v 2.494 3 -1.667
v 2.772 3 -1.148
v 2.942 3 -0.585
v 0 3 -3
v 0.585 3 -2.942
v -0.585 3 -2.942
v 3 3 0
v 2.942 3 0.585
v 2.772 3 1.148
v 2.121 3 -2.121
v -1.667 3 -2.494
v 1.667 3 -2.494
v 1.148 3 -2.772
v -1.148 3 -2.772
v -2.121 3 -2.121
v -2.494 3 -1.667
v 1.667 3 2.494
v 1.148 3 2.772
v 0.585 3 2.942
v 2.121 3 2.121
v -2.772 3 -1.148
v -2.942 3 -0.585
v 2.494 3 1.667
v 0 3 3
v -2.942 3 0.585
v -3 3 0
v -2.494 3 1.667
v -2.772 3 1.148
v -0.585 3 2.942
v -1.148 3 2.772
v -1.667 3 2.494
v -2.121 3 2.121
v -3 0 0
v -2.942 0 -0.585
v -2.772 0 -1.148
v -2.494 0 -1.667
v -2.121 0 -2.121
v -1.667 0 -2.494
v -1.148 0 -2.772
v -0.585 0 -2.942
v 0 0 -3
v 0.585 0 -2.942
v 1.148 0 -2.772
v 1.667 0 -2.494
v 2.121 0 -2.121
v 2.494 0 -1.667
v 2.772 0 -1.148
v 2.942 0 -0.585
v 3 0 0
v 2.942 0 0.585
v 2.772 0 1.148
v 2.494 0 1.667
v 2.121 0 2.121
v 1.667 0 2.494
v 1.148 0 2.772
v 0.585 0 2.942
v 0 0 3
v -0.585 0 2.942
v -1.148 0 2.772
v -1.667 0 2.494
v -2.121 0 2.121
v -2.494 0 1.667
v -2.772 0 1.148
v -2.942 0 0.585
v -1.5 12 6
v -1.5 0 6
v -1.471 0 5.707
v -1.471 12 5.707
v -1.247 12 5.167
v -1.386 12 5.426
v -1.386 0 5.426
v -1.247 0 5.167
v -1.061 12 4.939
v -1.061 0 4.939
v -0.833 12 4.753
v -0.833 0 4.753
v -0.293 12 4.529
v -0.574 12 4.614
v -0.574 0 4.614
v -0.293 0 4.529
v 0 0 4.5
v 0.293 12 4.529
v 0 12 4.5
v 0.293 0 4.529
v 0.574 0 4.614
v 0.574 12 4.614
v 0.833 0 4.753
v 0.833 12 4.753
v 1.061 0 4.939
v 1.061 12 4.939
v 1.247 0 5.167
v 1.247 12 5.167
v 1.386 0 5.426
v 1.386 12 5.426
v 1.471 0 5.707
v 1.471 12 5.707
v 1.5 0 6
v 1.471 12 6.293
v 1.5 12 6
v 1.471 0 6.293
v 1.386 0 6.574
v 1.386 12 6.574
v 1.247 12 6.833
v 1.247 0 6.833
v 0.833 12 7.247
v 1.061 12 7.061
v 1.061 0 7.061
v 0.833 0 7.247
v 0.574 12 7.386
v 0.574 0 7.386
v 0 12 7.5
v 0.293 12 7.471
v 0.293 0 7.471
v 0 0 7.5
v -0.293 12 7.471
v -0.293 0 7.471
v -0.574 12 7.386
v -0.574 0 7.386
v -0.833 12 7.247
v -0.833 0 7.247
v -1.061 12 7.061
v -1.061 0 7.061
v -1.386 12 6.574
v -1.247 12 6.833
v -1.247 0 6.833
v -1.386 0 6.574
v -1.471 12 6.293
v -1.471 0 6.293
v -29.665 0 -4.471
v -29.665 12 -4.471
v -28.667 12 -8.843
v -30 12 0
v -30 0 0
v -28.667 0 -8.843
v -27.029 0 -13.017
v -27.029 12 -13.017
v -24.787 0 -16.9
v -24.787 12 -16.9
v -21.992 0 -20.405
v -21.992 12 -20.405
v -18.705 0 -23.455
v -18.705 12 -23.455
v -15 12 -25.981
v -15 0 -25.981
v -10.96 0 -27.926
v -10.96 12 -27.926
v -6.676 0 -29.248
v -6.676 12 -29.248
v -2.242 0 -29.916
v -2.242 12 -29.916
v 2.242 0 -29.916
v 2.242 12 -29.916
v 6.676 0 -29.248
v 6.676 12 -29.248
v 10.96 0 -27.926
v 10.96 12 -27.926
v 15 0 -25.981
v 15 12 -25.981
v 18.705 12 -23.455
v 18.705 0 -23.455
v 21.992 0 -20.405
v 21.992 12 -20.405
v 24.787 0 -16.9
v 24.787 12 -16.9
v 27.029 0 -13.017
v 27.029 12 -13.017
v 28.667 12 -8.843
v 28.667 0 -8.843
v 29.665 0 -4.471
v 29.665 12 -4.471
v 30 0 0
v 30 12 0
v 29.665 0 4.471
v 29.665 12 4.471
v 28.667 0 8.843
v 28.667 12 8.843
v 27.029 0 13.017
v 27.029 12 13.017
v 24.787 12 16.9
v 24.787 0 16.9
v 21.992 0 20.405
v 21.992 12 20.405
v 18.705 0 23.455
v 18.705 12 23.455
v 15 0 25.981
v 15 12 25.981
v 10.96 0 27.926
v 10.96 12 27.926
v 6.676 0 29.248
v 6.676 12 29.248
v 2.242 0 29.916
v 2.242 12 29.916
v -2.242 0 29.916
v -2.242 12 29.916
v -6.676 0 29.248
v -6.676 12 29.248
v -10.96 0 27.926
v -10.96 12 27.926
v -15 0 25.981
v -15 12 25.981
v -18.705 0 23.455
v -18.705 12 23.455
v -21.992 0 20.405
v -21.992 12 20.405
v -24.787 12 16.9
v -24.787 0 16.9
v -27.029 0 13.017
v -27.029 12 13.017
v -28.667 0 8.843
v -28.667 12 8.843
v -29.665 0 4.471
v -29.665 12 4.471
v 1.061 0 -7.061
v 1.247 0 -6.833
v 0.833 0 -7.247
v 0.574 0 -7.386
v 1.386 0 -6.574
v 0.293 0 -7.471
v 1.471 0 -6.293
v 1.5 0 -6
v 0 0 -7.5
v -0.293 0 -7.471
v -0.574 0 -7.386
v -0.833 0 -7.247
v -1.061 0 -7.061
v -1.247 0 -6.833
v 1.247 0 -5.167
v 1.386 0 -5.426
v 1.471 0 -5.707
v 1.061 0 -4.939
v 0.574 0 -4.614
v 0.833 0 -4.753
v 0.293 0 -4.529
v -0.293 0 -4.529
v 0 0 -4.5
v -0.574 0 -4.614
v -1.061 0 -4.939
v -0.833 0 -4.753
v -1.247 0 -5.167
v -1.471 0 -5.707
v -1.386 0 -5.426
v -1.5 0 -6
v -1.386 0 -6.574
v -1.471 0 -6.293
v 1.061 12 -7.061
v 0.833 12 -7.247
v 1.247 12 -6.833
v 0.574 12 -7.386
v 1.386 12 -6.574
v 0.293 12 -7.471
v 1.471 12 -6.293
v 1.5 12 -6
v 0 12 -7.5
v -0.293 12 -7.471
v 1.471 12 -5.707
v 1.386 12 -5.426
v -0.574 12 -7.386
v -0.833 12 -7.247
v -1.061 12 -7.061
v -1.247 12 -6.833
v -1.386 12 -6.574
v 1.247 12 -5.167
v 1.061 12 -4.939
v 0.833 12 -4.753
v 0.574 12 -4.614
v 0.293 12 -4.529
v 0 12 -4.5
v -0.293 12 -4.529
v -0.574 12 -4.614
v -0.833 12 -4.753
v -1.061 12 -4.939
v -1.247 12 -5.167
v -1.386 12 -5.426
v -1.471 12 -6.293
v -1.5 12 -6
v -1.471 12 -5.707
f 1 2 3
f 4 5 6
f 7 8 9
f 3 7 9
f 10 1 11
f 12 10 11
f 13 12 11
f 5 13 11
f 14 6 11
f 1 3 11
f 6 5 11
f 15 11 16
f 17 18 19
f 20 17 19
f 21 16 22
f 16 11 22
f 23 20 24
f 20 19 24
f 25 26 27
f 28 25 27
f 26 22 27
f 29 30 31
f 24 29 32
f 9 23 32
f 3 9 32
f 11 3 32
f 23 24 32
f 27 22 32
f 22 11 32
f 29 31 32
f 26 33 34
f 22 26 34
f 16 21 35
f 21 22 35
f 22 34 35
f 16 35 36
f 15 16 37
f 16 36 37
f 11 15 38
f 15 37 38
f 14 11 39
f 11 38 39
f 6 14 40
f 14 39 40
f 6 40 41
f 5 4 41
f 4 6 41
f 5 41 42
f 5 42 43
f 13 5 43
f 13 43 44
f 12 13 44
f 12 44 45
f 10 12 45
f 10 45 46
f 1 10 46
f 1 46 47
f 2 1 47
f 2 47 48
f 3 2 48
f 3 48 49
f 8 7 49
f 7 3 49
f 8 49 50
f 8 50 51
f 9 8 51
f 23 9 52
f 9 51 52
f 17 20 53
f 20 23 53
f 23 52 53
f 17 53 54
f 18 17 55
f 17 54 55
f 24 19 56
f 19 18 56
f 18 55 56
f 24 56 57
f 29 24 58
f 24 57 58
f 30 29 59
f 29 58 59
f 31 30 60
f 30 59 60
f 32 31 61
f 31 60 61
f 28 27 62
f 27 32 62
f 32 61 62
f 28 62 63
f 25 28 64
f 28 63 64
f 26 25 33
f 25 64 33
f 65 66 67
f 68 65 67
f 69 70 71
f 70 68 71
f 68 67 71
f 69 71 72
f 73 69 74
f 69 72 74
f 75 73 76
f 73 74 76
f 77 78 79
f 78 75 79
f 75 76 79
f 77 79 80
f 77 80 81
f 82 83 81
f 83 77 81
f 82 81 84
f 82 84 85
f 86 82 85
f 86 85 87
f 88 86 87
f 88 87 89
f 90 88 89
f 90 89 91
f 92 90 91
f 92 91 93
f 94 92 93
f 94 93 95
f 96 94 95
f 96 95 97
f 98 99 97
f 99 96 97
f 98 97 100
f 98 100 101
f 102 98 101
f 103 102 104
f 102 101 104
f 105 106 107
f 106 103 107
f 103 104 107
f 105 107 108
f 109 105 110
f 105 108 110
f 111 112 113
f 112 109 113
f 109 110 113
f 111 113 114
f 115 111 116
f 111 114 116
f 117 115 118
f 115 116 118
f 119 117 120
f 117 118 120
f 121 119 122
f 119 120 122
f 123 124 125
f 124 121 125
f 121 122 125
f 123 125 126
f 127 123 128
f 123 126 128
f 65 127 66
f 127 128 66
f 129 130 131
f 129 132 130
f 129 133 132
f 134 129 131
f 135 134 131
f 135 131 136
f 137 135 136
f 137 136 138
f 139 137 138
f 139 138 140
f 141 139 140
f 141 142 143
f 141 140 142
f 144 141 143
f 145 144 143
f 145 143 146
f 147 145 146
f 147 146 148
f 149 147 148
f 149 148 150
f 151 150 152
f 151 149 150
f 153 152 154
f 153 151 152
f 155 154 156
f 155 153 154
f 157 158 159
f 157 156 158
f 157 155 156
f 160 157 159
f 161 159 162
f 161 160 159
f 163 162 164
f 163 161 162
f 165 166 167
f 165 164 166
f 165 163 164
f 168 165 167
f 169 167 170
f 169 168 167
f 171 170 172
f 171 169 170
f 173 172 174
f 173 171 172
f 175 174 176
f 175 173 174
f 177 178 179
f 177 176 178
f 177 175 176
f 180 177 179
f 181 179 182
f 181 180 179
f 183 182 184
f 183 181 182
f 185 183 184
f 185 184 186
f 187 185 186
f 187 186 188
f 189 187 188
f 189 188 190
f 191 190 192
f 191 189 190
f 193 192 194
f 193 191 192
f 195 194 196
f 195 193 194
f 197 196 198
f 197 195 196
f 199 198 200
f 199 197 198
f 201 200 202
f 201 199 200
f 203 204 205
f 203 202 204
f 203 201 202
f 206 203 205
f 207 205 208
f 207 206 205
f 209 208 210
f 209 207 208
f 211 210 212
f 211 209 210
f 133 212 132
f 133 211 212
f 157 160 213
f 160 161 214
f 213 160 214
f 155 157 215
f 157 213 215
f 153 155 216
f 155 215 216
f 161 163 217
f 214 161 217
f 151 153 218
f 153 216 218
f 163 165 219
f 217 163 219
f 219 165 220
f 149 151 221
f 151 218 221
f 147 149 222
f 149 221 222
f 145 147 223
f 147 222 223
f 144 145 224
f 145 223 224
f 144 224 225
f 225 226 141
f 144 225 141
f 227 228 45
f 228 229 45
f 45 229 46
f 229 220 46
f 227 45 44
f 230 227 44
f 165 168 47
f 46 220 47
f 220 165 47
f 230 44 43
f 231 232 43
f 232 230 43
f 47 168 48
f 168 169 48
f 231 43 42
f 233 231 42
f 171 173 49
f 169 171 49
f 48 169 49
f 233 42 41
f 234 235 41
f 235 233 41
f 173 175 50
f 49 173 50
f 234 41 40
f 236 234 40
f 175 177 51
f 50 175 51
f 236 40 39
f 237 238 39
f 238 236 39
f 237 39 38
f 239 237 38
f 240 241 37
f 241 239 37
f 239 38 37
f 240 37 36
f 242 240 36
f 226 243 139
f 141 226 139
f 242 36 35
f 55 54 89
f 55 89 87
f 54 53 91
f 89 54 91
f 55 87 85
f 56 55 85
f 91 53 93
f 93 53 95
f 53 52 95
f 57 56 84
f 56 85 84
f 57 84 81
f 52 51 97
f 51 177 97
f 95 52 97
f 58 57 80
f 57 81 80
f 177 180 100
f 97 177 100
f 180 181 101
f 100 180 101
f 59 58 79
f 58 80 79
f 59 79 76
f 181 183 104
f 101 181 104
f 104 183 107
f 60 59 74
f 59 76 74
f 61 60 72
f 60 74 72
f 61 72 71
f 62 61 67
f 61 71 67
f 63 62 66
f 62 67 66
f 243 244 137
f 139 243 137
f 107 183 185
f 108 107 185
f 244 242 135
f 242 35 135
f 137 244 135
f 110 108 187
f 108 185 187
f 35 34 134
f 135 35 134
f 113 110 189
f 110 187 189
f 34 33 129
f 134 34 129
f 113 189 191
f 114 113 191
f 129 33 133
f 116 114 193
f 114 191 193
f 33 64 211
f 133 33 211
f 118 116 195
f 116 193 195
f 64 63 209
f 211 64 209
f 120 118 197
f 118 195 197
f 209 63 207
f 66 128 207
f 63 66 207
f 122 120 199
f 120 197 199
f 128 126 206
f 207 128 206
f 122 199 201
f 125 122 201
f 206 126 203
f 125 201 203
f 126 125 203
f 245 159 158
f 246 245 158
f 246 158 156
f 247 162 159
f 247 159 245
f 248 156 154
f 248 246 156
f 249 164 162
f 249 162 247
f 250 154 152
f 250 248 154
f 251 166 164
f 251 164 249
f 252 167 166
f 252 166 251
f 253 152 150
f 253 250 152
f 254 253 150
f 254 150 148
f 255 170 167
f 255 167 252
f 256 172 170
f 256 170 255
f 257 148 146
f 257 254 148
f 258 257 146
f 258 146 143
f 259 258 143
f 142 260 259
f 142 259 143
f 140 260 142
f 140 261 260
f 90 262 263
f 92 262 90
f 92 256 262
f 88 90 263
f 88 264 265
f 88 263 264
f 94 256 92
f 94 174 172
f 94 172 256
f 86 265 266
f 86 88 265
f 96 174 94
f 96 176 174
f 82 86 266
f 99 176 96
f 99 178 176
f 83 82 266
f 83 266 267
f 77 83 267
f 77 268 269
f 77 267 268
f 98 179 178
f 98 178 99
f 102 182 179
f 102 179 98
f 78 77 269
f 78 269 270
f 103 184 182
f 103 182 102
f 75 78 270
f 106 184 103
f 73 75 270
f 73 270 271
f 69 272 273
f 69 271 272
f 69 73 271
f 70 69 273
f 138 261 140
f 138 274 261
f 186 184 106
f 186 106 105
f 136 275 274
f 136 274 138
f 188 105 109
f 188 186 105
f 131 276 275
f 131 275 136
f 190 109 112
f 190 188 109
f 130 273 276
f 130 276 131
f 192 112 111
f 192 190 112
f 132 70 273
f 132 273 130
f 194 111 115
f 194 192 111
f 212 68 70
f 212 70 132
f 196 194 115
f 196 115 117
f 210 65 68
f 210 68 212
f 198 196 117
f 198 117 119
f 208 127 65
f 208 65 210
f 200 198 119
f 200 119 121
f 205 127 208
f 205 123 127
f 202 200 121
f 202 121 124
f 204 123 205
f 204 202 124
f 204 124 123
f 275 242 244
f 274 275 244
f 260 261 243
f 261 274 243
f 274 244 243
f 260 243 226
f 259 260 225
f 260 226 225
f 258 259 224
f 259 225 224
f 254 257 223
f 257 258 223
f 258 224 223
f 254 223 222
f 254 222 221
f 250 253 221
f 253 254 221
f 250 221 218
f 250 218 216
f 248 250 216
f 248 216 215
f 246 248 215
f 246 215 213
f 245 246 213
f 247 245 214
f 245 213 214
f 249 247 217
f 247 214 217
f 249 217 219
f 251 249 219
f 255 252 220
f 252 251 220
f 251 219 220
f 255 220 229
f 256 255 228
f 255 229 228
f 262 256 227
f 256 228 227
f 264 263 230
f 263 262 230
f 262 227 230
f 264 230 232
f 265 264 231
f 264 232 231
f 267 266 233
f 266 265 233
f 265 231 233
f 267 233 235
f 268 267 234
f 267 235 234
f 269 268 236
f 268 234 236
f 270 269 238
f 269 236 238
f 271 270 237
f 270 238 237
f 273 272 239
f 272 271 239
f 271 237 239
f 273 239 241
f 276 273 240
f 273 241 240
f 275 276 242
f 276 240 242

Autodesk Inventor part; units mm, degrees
ref_plane "YZ Plane" through (0, 0, 0) normal (1, 0, 0) x (0, 1, 0)
ref_plane "XZ Plane" through (0, 0, 0) normal (0, 1, 0) x (-1, 0, 0)
ref_plane "XY Plane" through (0, 0, 0) normal (0, 0, 1) x (1, 0, 0)
sketch "スケッチ1" plane through (0, 0, 0) normal (0, 1, 0) x (-1, 0, 0)
  circle A0 centre (0, 0) radius 30
  circle A1 centre (0, 6) radius 1.5
  circle A2 centre (0, -6) radius 1.5
  circle A3 centre (0, 0) radius 3
  dimension "d0" = 60
  dimension "d1" = 9
  dimension "d2" = 6
  dimension "d3" = 3
  dimension "d4" = 3
  dimension "d5" = 6
  dimension "d6" = 6
extrude "押し出し1" add sketch "スケッチ1" along normal blind 12 contours A0 | A3
extrude "押し出し2" cut sketch "スケッチ1" along normal blind 3 contours A3
properties part number "タイヤ" material "木材 (オーク)"
